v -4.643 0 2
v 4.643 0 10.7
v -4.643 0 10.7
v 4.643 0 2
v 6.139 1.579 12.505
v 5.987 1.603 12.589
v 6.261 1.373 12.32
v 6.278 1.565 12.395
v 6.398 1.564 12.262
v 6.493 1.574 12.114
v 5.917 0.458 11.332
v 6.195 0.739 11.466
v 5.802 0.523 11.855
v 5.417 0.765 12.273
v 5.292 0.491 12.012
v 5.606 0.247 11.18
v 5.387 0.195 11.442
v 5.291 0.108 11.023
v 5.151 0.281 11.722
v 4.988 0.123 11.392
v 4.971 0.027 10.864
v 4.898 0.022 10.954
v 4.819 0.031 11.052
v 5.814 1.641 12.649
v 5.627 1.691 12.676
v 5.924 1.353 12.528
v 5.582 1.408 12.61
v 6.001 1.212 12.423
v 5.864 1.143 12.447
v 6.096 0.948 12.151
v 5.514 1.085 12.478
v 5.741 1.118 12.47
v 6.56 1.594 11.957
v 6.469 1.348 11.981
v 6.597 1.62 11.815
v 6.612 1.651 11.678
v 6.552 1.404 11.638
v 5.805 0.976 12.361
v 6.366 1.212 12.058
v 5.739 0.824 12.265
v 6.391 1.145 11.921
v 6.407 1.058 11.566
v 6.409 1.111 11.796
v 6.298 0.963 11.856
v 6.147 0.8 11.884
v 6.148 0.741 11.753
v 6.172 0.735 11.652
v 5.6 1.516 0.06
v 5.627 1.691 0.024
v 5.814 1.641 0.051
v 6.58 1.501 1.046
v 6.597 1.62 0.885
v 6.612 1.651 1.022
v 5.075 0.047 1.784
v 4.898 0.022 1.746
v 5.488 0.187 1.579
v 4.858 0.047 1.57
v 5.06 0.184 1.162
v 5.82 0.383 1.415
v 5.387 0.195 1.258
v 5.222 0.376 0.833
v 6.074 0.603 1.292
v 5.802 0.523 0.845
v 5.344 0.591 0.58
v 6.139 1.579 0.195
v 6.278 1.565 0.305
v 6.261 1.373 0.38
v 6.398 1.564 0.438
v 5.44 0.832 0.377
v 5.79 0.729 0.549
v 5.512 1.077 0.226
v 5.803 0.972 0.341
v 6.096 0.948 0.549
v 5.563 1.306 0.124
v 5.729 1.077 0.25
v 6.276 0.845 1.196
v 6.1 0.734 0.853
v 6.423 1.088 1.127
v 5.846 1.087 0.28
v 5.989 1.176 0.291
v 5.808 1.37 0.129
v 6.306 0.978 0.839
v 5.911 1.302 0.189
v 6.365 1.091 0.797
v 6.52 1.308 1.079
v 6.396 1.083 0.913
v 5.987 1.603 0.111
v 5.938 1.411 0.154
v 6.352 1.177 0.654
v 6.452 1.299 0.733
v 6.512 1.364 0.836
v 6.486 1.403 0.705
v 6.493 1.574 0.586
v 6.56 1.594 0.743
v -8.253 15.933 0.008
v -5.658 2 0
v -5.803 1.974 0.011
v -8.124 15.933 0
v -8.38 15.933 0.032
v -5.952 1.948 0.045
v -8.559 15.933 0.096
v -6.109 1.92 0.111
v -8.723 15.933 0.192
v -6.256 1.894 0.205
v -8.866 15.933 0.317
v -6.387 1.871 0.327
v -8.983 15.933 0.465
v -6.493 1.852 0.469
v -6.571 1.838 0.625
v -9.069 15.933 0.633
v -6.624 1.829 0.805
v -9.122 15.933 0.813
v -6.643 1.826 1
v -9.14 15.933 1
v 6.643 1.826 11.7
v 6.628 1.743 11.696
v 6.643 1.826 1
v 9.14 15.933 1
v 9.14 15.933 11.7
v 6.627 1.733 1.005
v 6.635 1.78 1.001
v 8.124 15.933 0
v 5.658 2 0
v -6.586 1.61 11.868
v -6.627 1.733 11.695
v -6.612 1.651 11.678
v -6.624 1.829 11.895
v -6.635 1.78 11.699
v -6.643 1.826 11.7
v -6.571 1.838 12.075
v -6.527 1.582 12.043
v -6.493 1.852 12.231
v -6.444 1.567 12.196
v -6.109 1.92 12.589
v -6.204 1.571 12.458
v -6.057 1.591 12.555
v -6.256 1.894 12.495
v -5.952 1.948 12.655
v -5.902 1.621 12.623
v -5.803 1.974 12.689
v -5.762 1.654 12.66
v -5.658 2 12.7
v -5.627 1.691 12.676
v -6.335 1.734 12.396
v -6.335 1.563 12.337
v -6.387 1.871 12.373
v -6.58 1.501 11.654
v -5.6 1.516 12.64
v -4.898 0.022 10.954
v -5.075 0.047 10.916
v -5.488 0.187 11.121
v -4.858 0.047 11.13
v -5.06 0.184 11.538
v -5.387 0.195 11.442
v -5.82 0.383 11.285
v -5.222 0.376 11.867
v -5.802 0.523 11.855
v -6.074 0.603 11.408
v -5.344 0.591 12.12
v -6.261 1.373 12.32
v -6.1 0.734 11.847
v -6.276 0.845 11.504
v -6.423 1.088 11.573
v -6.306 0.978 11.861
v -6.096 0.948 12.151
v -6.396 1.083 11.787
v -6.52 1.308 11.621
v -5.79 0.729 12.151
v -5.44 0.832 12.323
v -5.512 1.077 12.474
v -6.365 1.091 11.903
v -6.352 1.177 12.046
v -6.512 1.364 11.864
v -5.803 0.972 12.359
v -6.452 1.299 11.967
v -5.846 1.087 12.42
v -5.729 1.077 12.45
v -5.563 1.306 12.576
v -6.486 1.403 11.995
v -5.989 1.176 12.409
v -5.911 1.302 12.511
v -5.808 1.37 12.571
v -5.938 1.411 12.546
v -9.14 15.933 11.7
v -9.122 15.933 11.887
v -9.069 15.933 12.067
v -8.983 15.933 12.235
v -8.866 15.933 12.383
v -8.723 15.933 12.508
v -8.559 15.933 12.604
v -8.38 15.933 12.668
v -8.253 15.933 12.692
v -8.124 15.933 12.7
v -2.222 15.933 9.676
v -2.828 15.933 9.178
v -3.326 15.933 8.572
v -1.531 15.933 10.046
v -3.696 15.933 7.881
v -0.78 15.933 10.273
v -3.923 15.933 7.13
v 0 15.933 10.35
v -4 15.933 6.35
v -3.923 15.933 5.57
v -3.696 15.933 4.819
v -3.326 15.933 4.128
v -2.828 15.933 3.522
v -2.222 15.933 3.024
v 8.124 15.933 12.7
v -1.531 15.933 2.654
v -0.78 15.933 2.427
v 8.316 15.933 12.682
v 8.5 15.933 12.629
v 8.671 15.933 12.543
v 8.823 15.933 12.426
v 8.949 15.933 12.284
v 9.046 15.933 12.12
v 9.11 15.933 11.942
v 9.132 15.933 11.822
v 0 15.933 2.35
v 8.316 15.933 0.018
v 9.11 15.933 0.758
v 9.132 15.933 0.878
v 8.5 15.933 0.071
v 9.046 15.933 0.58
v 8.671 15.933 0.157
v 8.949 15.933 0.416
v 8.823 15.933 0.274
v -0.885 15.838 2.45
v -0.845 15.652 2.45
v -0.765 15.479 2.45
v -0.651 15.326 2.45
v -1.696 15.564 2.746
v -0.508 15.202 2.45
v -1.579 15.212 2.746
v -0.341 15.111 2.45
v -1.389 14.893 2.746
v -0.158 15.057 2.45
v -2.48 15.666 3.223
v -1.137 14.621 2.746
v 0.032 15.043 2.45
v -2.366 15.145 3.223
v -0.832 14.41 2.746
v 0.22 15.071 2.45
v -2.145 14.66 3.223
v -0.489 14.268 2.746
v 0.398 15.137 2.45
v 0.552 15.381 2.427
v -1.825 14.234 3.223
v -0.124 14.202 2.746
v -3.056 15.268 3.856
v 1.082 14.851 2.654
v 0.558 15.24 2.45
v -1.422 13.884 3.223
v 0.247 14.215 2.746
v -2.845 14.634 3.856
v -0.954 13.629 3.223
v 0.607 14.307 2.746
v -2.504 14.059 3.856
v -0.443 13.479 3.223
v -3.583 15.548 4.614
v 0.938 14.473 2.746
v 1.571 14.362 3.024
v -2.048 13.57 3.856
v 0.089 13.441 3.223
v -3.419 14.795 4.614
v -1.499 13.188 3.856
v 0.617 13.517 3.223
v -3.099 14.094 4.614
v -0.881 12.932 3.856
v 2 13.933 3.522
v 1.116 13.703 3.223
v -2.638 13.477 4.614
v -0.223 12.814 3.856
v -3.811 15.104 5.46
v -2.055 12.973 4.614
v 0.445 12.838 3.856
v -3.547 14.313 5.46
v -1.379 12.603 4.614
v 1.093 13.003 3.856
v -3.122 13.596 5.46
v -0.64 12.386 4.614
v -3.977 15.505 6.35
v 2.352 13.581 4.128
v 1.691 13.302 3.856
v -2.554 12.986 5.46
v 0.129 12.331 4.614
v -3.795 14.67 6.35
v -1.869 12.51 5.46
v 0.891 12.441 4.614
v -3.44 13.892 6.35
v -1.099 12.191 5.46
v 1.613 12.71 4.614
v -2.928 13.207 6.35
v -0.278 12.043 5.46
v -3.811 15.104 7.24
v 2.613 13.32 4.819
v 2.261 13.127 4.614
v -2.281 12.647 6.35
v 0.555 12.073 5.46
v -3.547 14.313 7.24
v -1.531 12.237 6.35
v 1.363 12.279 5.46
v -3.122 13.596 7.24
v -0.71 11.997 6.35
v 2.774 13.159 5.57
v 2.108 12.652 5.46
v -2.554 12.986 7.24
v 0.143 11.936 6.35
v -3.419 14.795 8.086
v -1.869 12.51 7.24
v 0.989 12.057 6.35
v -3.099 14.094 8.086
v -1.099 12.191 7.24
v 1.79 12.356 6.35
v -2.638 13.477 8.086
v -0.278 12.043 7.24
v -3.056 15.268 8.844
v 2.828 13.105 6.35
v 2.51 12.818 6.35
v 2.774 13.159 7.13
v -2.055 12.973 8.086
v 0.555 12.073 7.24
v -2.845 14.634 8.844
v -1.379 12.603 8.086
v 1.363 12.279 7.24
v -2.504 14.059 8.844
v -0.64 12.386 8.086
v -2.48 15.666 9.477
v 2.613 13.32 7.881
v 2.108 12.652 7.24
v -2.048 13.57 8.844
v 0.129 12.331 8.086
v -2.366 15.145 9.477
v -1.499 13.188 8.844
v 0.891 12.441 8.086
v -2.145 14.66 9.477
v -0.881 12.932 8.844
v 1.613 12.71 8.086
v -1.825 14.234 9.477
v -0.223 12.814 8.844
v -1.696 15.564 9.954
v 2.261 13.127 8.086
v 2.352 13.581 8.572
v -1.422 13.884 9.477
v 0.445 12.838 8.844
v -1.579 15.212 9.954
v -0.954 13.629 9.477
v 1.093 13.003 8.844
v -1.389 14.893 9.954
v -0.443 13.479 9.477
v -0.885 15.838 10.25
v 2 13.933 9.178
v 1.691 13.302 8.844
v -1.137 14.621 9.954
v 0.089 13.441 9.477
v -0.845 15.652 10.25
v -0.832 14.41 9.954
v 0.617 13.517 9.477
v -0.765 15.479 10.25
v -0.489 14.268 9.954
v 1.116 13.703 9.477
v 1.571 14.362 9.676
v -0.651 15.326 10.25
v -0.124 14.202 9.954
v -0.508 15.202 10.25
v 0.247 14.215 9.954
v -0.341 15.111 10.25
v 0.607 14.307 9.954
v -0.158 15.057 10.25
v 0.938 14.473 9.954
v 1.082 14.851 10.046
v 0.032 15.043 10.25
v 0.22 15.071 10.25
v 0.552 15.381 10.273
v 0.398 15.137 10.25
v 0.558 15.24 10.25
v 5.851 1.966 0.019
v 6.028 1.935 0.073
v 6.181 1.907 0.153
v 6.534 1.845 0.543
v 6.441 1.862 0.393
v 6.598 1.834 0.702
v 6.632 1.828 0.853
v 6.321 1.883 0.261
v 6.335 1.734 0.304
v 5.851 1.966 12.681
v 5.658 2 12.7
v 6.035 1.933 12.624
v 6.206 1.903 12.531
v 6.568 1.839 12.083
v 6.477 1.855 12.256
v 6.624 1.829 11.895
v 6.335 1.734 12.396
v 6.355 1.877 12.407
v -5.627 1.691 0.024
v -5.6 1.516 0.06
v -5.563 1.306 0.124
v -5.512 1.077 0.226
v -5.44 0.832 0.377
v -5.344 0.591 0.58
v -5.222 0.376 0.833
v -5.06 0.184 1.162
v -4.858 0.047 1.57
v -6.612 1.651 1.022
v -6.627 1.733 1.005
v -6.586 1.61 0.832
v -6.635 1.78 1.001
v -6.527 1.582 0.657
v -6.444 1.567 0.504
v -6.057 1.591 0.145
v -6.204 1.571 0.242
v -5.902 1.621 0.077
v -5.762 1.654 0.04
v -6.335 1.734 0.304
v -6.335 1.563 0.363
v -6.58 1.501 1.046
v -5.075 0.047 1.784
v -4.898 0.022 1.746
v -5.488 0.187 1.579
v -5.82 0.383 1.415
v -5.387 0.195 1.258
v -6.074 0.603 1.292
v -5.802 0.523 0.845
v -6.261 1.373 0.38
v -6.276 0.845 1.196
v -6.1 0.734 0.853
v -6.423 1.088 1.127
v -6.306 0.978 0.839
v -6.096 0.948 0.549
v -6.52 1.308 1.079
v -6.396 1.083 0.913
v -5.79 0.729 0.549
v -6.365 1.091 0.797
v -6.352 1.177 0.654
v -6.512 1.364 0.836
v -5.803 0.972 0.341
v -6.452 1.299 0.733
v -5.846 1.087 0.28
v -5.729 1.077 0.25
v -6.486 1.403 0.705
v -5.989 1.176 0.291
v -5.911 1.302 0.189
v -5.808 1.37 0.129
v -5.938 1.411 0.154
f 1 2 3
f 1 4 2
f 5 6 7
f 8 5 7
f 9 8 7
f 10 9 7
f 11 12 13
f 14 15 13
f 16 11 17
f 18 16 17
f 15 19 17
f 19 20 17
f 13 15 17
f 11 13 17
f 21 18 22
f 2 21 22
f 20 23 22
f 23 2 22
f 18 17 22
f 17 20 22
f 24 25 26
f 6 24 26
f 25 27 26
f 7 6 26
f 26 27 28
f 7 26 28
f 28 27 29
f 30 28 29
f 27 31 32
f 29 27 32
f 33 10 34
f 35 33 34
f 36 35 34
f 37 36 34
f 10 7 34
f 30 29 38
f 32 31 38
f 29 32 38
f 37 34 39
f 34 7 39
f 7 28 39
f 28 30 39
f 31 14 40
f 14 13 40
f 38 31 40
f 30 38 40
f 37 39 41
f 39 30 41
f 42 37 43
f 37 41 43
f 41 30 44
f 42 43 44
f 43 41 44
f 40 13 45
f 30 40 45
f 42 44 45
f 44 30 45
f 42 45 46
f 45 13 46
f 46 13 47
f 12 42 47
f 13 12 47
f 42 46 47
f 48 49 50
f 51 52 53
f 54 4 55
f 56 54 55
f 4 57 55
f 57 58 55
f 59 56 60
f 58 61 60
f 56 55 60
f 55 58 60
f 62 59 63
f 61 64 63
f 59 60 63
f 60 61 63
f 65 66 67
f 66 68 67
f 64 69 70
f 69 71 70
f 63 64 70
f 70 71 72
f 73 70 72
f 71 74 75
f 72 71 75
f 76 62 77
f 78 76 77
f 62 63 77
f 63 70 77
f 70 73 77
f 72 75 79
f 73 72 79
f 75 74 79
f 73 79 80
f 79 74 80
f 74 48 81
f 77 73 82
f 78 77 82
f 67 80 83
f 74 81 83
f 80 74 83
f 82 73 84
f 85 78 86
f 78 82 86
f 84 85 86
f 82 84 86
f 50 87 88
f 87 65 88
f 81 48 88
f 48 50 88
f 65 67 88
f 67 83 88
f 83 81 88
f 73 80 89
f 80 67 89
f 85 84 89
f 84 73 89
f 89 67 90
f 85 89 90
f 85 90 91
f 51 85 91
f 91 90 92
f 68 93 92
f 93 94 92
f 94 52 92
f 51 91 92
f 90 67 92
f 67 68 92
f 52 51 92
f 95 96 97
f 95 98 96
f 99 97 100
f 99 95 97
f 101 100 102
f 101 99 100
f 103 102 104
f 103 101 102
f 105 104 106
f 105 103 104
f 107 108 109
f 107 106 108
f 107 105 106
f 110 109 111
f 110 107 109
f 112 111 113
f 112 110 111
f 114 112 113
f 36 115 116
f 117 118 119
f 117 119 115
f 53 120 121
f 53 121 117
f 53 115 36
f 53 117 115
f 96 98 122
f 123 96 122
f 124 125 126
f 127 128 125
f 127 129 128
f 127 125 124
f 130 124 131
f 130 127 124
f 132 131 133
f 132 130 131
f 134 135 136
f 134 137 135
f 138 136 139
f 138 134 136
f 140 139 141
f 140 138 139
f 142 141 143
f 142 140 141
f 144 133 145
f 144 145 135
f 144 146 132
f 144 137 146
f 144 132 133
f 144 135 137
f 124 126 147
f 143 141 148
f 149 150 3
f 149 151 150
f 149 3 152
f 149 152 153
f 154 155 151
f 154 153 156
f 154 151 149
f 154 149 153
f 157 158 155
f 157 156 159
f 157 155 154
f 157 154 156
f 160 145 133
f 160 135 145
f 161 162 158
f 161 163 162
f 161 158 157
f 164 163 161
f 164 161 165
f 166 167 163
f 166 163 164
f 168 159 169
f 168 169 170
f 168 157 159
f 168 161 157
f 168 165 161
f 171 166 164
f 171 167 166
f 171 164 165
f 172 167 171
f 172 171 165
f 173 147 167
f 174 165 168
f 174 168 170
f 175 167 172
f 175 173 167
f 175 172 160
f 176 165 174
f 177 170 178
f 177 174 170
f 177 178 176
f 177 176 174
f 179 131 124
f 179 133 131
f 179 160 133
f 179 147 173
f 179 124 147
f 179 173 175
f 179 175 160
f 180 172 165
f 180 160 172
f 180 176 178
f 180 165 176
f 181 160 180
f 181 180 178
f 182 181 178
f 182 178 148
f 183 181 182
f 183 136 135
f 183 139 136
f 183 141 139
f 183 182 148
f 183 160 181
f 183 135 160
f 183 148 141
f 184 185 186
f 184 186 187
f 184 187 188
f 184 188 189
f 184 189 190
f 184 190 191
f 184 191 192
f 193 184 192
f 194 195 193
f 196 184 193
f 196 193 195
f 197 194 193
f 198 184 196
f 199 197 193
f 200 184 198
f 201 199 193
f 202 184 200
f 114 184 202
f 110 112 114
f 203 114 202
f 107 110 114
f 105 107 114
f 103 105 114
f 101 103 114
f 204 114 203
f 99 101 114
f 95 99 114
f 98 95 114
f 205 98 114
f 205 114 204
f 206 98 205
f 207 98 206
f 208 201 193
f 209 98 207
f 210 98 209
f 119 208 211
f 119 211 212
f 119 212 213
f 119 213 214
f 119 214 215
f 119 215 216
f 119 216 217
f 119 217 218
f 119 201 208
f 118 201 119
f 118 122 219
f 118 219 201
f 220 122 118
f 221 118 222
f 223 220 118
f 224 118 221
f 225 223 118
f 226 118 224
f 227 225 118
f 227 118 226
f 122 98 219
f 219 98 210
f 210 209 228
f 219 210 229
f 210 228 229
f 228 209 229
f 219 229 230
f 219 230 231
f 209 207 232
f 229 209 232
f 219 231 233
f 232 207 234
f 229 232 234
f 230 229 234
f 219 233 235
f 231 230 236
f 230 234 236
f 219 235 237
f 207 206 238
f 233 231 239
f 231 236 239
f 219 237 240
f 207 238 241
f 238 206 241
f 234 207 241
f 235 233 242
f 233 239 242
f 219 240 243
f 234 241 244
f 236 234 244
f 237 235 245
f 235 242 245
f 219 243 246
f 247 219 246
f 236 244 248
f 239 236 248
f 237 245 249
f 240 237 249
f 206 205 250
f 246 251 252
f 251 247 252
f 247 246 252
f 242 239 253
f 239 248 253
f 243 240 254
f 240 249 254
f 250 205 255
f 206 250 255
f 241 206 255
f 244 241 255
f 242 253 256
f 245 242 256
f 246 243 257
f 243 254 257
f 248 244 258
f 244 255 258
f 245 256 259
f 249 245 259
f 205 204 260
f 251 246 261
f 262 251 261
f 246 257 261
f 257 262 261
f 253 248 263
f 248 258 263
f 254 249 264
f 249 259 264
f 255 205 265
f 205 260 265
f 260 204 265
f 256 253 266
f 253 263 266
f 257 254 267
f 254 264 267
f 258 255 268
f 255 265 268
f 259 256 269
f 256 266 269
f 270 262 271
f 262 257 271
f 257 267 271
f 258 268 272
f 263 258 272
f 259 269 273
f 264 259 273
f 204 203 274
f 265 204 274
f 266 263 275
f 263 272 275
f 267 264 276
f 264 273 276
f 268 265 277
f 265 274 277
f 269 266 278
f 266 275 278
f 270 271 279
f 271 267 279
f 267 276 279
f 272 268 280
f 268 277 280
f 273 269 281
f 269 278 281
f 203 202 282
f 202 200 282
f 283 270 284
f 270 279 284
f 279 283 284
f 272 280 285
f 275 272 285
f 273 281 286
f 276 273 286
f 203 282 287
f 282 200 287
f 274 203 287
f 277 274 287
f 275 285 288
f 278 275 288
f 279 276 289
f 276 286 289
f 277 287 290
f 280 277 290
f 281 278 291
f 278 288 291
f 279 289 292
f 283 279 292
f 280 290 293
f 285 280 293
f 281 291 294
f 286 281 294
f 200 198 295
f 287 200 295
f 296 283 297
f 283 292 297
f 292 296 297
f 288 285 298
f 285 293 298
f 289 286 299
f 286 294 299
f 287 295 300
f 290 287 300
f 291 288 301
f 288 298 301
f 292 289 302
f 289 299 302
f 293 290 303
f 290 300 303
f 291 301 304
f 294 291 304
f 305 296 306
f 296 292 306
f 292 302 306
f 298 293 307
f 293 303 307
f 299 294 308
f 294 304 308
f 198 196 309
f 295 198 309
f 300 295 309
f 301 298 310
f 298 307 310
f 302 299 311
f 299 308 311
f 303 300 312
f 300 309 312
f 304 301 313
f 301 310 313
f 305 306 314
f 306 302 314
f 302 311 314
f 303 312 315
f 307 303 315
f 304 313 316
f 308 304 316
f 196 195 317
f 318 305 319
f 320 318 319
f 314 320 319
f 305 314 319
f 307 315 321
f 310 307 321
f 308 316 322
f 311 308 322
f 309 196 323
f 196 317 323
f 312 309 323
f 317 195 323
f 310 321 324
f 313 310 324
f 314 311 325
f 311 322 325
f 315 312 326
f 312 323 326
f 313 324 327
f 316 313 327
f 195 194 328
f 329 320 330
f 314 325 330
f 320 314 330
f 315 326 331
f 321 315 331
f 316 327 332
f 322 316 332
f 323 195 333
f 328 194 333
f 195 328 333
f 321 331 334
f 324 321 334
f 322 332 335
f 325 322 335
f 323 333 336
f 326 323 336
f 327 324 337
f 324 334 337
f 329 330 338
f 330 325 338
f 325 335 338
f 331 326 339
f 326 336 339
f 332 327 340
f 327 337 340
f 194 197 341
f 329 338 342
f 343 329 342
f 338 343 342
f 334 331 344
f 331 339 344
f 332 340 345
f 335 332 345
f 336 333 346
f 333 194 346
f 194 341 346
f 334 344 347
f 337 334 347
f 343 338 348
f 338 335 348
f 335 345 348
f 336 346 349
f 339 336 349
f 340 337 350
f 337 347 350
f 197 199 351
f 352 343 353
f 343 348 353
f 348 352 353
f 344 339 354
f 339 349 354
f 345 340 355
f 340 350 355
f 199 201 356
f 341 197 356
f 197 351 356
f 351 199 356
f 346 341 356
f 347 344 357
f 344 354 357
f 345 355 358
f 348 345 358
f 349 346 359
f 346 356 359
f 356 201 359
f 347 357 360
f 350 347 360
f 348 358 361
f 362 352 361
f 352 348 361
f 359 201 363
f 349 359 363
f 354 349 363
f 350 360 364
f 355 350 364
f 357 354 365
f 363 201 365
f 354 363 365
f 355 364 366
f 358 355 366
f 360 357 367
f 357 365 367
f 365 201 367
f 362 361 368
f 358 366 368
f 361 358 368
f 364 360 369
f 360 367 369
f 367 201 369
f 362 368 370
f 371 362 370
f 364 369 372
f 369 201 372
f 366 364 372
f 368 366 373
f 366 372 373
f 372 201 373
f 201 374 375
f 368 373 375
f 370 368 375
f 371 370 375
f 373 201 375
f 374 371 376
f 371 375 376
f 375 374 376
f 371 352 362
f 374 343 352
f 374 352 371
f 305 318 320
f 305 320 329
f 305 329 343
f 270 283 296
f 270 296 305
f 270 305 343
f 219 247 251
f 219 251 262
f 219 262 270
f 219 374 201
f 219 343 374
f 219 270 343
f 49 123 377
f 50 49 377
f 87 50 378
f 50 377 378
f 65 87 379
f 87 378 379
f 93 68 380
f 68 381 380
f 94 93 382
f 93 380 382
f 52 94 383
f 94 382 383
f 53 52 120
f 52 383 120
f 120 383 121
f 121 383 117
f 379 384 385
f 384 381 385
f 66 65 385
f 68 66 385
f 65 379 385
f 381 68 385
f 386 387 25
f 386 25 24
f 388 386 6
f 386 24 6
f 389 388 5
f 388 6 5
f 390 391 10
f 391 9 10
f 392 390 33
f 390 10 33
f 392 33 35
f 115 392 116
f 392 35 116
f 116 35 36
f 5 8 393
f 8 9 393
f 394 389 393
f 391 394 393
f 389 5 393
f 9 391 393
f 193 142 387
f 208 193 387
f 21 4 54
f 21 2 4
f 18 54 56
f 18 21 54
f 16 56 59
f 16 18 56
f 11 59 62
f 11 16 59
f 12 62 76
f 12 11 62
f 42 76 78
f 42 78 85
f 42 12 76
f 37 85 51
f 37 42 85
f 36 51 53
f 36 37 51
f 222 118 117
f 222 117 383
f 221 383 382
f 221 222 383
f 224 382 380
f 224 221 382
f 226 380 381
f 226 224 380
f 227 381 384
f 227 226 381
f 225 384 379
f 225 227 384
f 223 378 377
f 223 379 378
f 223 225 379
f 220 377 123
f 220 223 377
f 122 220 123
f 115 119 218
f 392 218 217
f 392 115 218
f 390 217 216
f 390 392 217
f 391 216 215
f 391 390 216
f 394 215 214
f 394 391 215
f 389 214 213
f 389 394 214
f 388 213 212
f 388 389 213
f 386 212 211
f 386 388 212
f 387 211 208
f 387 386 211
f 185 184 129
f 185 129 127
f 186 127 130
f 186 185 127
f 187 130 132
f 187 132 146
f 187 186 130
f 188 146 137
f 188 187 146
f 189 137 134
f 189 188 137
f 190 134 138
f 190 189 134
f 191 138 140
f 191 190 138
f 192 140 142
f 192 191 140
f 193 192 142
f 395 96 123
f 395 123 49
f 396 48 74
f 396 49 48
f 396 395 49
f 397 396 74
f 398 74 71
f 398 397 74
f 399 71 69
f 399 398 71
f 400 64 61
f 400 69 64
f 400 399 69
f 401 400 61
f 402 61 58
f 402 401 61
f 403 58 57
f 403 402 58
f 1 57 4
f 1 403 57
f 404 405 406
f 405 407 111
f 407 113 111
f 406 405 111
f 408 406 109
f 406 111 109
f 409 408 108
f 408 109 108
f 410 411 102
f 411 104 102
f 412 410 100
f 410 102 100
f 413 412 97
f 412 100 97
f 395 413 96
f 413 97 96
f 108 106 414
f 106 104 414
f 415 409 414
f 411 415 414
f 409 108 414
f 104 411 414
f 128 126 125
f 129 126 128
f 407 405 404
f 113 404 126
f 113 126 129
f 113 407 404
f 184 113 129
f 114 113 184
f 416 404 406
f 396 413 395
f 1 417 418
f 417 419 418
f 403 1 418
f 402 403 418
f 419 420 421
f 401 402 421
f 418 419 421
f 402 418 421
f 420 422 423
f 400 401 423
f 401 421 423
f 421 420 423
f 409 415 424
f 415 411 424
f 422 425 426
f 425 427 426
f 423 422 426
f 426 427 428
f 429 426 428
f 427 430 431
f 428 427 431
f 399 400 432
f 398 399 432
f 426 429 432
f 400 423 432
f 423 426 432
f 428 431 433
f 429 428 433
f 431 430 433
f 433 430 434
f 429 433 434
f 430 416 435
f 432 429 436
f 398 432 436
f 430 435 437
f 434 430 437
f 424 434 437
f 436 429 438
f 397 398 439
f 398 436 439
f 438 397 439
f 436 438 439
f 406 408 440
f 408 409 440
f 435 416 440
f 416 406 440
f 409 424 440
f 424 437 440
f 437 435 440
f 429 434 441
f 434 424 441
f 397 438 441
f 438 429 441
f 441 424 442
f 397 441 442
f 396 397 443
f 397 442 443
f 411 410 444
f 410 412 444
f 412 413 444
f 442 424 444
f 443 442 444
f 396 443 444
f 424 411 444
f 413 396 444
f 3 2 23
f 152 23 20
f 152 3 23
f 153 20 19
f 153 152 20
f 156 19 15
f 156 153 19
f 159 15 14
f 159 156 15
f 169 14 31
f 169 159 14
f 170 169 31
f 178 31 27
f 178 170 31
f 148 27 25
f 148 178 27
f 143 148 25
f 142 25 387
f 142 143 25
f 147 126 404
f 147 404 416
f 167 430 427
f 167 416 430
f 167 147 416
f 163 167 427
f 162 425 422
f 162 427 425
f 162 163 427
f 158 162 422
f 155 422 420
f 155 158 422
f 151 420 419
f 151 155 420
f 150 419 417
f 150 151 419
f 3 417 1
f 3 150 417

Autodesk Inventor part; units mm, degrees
ref_plane "YZ Plane" through (0, 0, 0) normal (1, 0, 0) x (0, 1, 0)
ref_plane "XZ Plane" through (0, 0, 0) normal (0, 1, 0) x (-1, 0, 0)
ref_plane "XY Plane" through (0, 0, 0) normal (0, 0, 1) x (1, 0, 0)
sketch "Sketch1" plane through (0, 0, 0) normal (0, 0, 1) x (1, 0, 0)
  line L0 (-6.32, 0) -> (-9.14, 15.933)
  line L1 (-9.14, 15.933) -> (9.14, 15.933)
  line L2 (9.14, 15.933) -> (6.32, 0)
  line L3 (6.32, 0) -> (-6.32, 0)
  point P0 (0, 0)
  point P1 (0, 15.933)
  point P2 (0, 0)
  dimension "d0" = 2.82
  dimension "d1" = 15.933
  dimension "d2" = 12.64
extrude "Extrusion1" add sketch "Sketch1" along normal blind 12.7
fillet "Fillet1" radius 2 4 edges at (0, 0, 0) (6.32, 0, 6.35) (0, 0, 12.7) (-6.32, 0, 6.35)
fillet "Fillet2" radius 1 12 edges at (7.907, 8.9665, 12.7) (5.928, 0.4675, 11.9851) (6.643, 1.825, 12.6923) (5.928, 0.4675, 0.7149) (7.907, 8.9665, 0) (6.643, 1.825, 0.0077) (-6.643, 1.825, 0.0077) (-7.907, 8.9665, 0) (-5.928, 0.4675, 0.7149) (-5.928, 0.4675, 11.9851) (-7.907, 8.9665, 12.7) (-6.643, 1.825, 12.6923)
sketch "Sketch2" plane through (-8.1245, 15.933, 0) normal (0, 1, 0) x (1, 0, 0)
  arc A0 (8.1245, -2.35) -> (8.1245, -10.35) centre (8.1245, -6.35) ccw
  line L0 (16.2489, 0) -> (0, 0) projected
  line L1 (8.1245, -10.35) -> (8.1245, -2.35)
  line L2 (-1.0155, -1) -> (-1.0155, -11.7) projected
  point P0 (8.1245, 0)
  point P1 (8.1245, 0)
  point P2 (-1.0155, -6.35)
  dimension "d7" = 4
revolve "Revolution1" cut sketch "Sketch2" angle 135 about axis through (0, 15.933, 10.35) along (0, 0, 1)
properties part number "OwnSpectr_TubeHolder_D_3DPrint"
